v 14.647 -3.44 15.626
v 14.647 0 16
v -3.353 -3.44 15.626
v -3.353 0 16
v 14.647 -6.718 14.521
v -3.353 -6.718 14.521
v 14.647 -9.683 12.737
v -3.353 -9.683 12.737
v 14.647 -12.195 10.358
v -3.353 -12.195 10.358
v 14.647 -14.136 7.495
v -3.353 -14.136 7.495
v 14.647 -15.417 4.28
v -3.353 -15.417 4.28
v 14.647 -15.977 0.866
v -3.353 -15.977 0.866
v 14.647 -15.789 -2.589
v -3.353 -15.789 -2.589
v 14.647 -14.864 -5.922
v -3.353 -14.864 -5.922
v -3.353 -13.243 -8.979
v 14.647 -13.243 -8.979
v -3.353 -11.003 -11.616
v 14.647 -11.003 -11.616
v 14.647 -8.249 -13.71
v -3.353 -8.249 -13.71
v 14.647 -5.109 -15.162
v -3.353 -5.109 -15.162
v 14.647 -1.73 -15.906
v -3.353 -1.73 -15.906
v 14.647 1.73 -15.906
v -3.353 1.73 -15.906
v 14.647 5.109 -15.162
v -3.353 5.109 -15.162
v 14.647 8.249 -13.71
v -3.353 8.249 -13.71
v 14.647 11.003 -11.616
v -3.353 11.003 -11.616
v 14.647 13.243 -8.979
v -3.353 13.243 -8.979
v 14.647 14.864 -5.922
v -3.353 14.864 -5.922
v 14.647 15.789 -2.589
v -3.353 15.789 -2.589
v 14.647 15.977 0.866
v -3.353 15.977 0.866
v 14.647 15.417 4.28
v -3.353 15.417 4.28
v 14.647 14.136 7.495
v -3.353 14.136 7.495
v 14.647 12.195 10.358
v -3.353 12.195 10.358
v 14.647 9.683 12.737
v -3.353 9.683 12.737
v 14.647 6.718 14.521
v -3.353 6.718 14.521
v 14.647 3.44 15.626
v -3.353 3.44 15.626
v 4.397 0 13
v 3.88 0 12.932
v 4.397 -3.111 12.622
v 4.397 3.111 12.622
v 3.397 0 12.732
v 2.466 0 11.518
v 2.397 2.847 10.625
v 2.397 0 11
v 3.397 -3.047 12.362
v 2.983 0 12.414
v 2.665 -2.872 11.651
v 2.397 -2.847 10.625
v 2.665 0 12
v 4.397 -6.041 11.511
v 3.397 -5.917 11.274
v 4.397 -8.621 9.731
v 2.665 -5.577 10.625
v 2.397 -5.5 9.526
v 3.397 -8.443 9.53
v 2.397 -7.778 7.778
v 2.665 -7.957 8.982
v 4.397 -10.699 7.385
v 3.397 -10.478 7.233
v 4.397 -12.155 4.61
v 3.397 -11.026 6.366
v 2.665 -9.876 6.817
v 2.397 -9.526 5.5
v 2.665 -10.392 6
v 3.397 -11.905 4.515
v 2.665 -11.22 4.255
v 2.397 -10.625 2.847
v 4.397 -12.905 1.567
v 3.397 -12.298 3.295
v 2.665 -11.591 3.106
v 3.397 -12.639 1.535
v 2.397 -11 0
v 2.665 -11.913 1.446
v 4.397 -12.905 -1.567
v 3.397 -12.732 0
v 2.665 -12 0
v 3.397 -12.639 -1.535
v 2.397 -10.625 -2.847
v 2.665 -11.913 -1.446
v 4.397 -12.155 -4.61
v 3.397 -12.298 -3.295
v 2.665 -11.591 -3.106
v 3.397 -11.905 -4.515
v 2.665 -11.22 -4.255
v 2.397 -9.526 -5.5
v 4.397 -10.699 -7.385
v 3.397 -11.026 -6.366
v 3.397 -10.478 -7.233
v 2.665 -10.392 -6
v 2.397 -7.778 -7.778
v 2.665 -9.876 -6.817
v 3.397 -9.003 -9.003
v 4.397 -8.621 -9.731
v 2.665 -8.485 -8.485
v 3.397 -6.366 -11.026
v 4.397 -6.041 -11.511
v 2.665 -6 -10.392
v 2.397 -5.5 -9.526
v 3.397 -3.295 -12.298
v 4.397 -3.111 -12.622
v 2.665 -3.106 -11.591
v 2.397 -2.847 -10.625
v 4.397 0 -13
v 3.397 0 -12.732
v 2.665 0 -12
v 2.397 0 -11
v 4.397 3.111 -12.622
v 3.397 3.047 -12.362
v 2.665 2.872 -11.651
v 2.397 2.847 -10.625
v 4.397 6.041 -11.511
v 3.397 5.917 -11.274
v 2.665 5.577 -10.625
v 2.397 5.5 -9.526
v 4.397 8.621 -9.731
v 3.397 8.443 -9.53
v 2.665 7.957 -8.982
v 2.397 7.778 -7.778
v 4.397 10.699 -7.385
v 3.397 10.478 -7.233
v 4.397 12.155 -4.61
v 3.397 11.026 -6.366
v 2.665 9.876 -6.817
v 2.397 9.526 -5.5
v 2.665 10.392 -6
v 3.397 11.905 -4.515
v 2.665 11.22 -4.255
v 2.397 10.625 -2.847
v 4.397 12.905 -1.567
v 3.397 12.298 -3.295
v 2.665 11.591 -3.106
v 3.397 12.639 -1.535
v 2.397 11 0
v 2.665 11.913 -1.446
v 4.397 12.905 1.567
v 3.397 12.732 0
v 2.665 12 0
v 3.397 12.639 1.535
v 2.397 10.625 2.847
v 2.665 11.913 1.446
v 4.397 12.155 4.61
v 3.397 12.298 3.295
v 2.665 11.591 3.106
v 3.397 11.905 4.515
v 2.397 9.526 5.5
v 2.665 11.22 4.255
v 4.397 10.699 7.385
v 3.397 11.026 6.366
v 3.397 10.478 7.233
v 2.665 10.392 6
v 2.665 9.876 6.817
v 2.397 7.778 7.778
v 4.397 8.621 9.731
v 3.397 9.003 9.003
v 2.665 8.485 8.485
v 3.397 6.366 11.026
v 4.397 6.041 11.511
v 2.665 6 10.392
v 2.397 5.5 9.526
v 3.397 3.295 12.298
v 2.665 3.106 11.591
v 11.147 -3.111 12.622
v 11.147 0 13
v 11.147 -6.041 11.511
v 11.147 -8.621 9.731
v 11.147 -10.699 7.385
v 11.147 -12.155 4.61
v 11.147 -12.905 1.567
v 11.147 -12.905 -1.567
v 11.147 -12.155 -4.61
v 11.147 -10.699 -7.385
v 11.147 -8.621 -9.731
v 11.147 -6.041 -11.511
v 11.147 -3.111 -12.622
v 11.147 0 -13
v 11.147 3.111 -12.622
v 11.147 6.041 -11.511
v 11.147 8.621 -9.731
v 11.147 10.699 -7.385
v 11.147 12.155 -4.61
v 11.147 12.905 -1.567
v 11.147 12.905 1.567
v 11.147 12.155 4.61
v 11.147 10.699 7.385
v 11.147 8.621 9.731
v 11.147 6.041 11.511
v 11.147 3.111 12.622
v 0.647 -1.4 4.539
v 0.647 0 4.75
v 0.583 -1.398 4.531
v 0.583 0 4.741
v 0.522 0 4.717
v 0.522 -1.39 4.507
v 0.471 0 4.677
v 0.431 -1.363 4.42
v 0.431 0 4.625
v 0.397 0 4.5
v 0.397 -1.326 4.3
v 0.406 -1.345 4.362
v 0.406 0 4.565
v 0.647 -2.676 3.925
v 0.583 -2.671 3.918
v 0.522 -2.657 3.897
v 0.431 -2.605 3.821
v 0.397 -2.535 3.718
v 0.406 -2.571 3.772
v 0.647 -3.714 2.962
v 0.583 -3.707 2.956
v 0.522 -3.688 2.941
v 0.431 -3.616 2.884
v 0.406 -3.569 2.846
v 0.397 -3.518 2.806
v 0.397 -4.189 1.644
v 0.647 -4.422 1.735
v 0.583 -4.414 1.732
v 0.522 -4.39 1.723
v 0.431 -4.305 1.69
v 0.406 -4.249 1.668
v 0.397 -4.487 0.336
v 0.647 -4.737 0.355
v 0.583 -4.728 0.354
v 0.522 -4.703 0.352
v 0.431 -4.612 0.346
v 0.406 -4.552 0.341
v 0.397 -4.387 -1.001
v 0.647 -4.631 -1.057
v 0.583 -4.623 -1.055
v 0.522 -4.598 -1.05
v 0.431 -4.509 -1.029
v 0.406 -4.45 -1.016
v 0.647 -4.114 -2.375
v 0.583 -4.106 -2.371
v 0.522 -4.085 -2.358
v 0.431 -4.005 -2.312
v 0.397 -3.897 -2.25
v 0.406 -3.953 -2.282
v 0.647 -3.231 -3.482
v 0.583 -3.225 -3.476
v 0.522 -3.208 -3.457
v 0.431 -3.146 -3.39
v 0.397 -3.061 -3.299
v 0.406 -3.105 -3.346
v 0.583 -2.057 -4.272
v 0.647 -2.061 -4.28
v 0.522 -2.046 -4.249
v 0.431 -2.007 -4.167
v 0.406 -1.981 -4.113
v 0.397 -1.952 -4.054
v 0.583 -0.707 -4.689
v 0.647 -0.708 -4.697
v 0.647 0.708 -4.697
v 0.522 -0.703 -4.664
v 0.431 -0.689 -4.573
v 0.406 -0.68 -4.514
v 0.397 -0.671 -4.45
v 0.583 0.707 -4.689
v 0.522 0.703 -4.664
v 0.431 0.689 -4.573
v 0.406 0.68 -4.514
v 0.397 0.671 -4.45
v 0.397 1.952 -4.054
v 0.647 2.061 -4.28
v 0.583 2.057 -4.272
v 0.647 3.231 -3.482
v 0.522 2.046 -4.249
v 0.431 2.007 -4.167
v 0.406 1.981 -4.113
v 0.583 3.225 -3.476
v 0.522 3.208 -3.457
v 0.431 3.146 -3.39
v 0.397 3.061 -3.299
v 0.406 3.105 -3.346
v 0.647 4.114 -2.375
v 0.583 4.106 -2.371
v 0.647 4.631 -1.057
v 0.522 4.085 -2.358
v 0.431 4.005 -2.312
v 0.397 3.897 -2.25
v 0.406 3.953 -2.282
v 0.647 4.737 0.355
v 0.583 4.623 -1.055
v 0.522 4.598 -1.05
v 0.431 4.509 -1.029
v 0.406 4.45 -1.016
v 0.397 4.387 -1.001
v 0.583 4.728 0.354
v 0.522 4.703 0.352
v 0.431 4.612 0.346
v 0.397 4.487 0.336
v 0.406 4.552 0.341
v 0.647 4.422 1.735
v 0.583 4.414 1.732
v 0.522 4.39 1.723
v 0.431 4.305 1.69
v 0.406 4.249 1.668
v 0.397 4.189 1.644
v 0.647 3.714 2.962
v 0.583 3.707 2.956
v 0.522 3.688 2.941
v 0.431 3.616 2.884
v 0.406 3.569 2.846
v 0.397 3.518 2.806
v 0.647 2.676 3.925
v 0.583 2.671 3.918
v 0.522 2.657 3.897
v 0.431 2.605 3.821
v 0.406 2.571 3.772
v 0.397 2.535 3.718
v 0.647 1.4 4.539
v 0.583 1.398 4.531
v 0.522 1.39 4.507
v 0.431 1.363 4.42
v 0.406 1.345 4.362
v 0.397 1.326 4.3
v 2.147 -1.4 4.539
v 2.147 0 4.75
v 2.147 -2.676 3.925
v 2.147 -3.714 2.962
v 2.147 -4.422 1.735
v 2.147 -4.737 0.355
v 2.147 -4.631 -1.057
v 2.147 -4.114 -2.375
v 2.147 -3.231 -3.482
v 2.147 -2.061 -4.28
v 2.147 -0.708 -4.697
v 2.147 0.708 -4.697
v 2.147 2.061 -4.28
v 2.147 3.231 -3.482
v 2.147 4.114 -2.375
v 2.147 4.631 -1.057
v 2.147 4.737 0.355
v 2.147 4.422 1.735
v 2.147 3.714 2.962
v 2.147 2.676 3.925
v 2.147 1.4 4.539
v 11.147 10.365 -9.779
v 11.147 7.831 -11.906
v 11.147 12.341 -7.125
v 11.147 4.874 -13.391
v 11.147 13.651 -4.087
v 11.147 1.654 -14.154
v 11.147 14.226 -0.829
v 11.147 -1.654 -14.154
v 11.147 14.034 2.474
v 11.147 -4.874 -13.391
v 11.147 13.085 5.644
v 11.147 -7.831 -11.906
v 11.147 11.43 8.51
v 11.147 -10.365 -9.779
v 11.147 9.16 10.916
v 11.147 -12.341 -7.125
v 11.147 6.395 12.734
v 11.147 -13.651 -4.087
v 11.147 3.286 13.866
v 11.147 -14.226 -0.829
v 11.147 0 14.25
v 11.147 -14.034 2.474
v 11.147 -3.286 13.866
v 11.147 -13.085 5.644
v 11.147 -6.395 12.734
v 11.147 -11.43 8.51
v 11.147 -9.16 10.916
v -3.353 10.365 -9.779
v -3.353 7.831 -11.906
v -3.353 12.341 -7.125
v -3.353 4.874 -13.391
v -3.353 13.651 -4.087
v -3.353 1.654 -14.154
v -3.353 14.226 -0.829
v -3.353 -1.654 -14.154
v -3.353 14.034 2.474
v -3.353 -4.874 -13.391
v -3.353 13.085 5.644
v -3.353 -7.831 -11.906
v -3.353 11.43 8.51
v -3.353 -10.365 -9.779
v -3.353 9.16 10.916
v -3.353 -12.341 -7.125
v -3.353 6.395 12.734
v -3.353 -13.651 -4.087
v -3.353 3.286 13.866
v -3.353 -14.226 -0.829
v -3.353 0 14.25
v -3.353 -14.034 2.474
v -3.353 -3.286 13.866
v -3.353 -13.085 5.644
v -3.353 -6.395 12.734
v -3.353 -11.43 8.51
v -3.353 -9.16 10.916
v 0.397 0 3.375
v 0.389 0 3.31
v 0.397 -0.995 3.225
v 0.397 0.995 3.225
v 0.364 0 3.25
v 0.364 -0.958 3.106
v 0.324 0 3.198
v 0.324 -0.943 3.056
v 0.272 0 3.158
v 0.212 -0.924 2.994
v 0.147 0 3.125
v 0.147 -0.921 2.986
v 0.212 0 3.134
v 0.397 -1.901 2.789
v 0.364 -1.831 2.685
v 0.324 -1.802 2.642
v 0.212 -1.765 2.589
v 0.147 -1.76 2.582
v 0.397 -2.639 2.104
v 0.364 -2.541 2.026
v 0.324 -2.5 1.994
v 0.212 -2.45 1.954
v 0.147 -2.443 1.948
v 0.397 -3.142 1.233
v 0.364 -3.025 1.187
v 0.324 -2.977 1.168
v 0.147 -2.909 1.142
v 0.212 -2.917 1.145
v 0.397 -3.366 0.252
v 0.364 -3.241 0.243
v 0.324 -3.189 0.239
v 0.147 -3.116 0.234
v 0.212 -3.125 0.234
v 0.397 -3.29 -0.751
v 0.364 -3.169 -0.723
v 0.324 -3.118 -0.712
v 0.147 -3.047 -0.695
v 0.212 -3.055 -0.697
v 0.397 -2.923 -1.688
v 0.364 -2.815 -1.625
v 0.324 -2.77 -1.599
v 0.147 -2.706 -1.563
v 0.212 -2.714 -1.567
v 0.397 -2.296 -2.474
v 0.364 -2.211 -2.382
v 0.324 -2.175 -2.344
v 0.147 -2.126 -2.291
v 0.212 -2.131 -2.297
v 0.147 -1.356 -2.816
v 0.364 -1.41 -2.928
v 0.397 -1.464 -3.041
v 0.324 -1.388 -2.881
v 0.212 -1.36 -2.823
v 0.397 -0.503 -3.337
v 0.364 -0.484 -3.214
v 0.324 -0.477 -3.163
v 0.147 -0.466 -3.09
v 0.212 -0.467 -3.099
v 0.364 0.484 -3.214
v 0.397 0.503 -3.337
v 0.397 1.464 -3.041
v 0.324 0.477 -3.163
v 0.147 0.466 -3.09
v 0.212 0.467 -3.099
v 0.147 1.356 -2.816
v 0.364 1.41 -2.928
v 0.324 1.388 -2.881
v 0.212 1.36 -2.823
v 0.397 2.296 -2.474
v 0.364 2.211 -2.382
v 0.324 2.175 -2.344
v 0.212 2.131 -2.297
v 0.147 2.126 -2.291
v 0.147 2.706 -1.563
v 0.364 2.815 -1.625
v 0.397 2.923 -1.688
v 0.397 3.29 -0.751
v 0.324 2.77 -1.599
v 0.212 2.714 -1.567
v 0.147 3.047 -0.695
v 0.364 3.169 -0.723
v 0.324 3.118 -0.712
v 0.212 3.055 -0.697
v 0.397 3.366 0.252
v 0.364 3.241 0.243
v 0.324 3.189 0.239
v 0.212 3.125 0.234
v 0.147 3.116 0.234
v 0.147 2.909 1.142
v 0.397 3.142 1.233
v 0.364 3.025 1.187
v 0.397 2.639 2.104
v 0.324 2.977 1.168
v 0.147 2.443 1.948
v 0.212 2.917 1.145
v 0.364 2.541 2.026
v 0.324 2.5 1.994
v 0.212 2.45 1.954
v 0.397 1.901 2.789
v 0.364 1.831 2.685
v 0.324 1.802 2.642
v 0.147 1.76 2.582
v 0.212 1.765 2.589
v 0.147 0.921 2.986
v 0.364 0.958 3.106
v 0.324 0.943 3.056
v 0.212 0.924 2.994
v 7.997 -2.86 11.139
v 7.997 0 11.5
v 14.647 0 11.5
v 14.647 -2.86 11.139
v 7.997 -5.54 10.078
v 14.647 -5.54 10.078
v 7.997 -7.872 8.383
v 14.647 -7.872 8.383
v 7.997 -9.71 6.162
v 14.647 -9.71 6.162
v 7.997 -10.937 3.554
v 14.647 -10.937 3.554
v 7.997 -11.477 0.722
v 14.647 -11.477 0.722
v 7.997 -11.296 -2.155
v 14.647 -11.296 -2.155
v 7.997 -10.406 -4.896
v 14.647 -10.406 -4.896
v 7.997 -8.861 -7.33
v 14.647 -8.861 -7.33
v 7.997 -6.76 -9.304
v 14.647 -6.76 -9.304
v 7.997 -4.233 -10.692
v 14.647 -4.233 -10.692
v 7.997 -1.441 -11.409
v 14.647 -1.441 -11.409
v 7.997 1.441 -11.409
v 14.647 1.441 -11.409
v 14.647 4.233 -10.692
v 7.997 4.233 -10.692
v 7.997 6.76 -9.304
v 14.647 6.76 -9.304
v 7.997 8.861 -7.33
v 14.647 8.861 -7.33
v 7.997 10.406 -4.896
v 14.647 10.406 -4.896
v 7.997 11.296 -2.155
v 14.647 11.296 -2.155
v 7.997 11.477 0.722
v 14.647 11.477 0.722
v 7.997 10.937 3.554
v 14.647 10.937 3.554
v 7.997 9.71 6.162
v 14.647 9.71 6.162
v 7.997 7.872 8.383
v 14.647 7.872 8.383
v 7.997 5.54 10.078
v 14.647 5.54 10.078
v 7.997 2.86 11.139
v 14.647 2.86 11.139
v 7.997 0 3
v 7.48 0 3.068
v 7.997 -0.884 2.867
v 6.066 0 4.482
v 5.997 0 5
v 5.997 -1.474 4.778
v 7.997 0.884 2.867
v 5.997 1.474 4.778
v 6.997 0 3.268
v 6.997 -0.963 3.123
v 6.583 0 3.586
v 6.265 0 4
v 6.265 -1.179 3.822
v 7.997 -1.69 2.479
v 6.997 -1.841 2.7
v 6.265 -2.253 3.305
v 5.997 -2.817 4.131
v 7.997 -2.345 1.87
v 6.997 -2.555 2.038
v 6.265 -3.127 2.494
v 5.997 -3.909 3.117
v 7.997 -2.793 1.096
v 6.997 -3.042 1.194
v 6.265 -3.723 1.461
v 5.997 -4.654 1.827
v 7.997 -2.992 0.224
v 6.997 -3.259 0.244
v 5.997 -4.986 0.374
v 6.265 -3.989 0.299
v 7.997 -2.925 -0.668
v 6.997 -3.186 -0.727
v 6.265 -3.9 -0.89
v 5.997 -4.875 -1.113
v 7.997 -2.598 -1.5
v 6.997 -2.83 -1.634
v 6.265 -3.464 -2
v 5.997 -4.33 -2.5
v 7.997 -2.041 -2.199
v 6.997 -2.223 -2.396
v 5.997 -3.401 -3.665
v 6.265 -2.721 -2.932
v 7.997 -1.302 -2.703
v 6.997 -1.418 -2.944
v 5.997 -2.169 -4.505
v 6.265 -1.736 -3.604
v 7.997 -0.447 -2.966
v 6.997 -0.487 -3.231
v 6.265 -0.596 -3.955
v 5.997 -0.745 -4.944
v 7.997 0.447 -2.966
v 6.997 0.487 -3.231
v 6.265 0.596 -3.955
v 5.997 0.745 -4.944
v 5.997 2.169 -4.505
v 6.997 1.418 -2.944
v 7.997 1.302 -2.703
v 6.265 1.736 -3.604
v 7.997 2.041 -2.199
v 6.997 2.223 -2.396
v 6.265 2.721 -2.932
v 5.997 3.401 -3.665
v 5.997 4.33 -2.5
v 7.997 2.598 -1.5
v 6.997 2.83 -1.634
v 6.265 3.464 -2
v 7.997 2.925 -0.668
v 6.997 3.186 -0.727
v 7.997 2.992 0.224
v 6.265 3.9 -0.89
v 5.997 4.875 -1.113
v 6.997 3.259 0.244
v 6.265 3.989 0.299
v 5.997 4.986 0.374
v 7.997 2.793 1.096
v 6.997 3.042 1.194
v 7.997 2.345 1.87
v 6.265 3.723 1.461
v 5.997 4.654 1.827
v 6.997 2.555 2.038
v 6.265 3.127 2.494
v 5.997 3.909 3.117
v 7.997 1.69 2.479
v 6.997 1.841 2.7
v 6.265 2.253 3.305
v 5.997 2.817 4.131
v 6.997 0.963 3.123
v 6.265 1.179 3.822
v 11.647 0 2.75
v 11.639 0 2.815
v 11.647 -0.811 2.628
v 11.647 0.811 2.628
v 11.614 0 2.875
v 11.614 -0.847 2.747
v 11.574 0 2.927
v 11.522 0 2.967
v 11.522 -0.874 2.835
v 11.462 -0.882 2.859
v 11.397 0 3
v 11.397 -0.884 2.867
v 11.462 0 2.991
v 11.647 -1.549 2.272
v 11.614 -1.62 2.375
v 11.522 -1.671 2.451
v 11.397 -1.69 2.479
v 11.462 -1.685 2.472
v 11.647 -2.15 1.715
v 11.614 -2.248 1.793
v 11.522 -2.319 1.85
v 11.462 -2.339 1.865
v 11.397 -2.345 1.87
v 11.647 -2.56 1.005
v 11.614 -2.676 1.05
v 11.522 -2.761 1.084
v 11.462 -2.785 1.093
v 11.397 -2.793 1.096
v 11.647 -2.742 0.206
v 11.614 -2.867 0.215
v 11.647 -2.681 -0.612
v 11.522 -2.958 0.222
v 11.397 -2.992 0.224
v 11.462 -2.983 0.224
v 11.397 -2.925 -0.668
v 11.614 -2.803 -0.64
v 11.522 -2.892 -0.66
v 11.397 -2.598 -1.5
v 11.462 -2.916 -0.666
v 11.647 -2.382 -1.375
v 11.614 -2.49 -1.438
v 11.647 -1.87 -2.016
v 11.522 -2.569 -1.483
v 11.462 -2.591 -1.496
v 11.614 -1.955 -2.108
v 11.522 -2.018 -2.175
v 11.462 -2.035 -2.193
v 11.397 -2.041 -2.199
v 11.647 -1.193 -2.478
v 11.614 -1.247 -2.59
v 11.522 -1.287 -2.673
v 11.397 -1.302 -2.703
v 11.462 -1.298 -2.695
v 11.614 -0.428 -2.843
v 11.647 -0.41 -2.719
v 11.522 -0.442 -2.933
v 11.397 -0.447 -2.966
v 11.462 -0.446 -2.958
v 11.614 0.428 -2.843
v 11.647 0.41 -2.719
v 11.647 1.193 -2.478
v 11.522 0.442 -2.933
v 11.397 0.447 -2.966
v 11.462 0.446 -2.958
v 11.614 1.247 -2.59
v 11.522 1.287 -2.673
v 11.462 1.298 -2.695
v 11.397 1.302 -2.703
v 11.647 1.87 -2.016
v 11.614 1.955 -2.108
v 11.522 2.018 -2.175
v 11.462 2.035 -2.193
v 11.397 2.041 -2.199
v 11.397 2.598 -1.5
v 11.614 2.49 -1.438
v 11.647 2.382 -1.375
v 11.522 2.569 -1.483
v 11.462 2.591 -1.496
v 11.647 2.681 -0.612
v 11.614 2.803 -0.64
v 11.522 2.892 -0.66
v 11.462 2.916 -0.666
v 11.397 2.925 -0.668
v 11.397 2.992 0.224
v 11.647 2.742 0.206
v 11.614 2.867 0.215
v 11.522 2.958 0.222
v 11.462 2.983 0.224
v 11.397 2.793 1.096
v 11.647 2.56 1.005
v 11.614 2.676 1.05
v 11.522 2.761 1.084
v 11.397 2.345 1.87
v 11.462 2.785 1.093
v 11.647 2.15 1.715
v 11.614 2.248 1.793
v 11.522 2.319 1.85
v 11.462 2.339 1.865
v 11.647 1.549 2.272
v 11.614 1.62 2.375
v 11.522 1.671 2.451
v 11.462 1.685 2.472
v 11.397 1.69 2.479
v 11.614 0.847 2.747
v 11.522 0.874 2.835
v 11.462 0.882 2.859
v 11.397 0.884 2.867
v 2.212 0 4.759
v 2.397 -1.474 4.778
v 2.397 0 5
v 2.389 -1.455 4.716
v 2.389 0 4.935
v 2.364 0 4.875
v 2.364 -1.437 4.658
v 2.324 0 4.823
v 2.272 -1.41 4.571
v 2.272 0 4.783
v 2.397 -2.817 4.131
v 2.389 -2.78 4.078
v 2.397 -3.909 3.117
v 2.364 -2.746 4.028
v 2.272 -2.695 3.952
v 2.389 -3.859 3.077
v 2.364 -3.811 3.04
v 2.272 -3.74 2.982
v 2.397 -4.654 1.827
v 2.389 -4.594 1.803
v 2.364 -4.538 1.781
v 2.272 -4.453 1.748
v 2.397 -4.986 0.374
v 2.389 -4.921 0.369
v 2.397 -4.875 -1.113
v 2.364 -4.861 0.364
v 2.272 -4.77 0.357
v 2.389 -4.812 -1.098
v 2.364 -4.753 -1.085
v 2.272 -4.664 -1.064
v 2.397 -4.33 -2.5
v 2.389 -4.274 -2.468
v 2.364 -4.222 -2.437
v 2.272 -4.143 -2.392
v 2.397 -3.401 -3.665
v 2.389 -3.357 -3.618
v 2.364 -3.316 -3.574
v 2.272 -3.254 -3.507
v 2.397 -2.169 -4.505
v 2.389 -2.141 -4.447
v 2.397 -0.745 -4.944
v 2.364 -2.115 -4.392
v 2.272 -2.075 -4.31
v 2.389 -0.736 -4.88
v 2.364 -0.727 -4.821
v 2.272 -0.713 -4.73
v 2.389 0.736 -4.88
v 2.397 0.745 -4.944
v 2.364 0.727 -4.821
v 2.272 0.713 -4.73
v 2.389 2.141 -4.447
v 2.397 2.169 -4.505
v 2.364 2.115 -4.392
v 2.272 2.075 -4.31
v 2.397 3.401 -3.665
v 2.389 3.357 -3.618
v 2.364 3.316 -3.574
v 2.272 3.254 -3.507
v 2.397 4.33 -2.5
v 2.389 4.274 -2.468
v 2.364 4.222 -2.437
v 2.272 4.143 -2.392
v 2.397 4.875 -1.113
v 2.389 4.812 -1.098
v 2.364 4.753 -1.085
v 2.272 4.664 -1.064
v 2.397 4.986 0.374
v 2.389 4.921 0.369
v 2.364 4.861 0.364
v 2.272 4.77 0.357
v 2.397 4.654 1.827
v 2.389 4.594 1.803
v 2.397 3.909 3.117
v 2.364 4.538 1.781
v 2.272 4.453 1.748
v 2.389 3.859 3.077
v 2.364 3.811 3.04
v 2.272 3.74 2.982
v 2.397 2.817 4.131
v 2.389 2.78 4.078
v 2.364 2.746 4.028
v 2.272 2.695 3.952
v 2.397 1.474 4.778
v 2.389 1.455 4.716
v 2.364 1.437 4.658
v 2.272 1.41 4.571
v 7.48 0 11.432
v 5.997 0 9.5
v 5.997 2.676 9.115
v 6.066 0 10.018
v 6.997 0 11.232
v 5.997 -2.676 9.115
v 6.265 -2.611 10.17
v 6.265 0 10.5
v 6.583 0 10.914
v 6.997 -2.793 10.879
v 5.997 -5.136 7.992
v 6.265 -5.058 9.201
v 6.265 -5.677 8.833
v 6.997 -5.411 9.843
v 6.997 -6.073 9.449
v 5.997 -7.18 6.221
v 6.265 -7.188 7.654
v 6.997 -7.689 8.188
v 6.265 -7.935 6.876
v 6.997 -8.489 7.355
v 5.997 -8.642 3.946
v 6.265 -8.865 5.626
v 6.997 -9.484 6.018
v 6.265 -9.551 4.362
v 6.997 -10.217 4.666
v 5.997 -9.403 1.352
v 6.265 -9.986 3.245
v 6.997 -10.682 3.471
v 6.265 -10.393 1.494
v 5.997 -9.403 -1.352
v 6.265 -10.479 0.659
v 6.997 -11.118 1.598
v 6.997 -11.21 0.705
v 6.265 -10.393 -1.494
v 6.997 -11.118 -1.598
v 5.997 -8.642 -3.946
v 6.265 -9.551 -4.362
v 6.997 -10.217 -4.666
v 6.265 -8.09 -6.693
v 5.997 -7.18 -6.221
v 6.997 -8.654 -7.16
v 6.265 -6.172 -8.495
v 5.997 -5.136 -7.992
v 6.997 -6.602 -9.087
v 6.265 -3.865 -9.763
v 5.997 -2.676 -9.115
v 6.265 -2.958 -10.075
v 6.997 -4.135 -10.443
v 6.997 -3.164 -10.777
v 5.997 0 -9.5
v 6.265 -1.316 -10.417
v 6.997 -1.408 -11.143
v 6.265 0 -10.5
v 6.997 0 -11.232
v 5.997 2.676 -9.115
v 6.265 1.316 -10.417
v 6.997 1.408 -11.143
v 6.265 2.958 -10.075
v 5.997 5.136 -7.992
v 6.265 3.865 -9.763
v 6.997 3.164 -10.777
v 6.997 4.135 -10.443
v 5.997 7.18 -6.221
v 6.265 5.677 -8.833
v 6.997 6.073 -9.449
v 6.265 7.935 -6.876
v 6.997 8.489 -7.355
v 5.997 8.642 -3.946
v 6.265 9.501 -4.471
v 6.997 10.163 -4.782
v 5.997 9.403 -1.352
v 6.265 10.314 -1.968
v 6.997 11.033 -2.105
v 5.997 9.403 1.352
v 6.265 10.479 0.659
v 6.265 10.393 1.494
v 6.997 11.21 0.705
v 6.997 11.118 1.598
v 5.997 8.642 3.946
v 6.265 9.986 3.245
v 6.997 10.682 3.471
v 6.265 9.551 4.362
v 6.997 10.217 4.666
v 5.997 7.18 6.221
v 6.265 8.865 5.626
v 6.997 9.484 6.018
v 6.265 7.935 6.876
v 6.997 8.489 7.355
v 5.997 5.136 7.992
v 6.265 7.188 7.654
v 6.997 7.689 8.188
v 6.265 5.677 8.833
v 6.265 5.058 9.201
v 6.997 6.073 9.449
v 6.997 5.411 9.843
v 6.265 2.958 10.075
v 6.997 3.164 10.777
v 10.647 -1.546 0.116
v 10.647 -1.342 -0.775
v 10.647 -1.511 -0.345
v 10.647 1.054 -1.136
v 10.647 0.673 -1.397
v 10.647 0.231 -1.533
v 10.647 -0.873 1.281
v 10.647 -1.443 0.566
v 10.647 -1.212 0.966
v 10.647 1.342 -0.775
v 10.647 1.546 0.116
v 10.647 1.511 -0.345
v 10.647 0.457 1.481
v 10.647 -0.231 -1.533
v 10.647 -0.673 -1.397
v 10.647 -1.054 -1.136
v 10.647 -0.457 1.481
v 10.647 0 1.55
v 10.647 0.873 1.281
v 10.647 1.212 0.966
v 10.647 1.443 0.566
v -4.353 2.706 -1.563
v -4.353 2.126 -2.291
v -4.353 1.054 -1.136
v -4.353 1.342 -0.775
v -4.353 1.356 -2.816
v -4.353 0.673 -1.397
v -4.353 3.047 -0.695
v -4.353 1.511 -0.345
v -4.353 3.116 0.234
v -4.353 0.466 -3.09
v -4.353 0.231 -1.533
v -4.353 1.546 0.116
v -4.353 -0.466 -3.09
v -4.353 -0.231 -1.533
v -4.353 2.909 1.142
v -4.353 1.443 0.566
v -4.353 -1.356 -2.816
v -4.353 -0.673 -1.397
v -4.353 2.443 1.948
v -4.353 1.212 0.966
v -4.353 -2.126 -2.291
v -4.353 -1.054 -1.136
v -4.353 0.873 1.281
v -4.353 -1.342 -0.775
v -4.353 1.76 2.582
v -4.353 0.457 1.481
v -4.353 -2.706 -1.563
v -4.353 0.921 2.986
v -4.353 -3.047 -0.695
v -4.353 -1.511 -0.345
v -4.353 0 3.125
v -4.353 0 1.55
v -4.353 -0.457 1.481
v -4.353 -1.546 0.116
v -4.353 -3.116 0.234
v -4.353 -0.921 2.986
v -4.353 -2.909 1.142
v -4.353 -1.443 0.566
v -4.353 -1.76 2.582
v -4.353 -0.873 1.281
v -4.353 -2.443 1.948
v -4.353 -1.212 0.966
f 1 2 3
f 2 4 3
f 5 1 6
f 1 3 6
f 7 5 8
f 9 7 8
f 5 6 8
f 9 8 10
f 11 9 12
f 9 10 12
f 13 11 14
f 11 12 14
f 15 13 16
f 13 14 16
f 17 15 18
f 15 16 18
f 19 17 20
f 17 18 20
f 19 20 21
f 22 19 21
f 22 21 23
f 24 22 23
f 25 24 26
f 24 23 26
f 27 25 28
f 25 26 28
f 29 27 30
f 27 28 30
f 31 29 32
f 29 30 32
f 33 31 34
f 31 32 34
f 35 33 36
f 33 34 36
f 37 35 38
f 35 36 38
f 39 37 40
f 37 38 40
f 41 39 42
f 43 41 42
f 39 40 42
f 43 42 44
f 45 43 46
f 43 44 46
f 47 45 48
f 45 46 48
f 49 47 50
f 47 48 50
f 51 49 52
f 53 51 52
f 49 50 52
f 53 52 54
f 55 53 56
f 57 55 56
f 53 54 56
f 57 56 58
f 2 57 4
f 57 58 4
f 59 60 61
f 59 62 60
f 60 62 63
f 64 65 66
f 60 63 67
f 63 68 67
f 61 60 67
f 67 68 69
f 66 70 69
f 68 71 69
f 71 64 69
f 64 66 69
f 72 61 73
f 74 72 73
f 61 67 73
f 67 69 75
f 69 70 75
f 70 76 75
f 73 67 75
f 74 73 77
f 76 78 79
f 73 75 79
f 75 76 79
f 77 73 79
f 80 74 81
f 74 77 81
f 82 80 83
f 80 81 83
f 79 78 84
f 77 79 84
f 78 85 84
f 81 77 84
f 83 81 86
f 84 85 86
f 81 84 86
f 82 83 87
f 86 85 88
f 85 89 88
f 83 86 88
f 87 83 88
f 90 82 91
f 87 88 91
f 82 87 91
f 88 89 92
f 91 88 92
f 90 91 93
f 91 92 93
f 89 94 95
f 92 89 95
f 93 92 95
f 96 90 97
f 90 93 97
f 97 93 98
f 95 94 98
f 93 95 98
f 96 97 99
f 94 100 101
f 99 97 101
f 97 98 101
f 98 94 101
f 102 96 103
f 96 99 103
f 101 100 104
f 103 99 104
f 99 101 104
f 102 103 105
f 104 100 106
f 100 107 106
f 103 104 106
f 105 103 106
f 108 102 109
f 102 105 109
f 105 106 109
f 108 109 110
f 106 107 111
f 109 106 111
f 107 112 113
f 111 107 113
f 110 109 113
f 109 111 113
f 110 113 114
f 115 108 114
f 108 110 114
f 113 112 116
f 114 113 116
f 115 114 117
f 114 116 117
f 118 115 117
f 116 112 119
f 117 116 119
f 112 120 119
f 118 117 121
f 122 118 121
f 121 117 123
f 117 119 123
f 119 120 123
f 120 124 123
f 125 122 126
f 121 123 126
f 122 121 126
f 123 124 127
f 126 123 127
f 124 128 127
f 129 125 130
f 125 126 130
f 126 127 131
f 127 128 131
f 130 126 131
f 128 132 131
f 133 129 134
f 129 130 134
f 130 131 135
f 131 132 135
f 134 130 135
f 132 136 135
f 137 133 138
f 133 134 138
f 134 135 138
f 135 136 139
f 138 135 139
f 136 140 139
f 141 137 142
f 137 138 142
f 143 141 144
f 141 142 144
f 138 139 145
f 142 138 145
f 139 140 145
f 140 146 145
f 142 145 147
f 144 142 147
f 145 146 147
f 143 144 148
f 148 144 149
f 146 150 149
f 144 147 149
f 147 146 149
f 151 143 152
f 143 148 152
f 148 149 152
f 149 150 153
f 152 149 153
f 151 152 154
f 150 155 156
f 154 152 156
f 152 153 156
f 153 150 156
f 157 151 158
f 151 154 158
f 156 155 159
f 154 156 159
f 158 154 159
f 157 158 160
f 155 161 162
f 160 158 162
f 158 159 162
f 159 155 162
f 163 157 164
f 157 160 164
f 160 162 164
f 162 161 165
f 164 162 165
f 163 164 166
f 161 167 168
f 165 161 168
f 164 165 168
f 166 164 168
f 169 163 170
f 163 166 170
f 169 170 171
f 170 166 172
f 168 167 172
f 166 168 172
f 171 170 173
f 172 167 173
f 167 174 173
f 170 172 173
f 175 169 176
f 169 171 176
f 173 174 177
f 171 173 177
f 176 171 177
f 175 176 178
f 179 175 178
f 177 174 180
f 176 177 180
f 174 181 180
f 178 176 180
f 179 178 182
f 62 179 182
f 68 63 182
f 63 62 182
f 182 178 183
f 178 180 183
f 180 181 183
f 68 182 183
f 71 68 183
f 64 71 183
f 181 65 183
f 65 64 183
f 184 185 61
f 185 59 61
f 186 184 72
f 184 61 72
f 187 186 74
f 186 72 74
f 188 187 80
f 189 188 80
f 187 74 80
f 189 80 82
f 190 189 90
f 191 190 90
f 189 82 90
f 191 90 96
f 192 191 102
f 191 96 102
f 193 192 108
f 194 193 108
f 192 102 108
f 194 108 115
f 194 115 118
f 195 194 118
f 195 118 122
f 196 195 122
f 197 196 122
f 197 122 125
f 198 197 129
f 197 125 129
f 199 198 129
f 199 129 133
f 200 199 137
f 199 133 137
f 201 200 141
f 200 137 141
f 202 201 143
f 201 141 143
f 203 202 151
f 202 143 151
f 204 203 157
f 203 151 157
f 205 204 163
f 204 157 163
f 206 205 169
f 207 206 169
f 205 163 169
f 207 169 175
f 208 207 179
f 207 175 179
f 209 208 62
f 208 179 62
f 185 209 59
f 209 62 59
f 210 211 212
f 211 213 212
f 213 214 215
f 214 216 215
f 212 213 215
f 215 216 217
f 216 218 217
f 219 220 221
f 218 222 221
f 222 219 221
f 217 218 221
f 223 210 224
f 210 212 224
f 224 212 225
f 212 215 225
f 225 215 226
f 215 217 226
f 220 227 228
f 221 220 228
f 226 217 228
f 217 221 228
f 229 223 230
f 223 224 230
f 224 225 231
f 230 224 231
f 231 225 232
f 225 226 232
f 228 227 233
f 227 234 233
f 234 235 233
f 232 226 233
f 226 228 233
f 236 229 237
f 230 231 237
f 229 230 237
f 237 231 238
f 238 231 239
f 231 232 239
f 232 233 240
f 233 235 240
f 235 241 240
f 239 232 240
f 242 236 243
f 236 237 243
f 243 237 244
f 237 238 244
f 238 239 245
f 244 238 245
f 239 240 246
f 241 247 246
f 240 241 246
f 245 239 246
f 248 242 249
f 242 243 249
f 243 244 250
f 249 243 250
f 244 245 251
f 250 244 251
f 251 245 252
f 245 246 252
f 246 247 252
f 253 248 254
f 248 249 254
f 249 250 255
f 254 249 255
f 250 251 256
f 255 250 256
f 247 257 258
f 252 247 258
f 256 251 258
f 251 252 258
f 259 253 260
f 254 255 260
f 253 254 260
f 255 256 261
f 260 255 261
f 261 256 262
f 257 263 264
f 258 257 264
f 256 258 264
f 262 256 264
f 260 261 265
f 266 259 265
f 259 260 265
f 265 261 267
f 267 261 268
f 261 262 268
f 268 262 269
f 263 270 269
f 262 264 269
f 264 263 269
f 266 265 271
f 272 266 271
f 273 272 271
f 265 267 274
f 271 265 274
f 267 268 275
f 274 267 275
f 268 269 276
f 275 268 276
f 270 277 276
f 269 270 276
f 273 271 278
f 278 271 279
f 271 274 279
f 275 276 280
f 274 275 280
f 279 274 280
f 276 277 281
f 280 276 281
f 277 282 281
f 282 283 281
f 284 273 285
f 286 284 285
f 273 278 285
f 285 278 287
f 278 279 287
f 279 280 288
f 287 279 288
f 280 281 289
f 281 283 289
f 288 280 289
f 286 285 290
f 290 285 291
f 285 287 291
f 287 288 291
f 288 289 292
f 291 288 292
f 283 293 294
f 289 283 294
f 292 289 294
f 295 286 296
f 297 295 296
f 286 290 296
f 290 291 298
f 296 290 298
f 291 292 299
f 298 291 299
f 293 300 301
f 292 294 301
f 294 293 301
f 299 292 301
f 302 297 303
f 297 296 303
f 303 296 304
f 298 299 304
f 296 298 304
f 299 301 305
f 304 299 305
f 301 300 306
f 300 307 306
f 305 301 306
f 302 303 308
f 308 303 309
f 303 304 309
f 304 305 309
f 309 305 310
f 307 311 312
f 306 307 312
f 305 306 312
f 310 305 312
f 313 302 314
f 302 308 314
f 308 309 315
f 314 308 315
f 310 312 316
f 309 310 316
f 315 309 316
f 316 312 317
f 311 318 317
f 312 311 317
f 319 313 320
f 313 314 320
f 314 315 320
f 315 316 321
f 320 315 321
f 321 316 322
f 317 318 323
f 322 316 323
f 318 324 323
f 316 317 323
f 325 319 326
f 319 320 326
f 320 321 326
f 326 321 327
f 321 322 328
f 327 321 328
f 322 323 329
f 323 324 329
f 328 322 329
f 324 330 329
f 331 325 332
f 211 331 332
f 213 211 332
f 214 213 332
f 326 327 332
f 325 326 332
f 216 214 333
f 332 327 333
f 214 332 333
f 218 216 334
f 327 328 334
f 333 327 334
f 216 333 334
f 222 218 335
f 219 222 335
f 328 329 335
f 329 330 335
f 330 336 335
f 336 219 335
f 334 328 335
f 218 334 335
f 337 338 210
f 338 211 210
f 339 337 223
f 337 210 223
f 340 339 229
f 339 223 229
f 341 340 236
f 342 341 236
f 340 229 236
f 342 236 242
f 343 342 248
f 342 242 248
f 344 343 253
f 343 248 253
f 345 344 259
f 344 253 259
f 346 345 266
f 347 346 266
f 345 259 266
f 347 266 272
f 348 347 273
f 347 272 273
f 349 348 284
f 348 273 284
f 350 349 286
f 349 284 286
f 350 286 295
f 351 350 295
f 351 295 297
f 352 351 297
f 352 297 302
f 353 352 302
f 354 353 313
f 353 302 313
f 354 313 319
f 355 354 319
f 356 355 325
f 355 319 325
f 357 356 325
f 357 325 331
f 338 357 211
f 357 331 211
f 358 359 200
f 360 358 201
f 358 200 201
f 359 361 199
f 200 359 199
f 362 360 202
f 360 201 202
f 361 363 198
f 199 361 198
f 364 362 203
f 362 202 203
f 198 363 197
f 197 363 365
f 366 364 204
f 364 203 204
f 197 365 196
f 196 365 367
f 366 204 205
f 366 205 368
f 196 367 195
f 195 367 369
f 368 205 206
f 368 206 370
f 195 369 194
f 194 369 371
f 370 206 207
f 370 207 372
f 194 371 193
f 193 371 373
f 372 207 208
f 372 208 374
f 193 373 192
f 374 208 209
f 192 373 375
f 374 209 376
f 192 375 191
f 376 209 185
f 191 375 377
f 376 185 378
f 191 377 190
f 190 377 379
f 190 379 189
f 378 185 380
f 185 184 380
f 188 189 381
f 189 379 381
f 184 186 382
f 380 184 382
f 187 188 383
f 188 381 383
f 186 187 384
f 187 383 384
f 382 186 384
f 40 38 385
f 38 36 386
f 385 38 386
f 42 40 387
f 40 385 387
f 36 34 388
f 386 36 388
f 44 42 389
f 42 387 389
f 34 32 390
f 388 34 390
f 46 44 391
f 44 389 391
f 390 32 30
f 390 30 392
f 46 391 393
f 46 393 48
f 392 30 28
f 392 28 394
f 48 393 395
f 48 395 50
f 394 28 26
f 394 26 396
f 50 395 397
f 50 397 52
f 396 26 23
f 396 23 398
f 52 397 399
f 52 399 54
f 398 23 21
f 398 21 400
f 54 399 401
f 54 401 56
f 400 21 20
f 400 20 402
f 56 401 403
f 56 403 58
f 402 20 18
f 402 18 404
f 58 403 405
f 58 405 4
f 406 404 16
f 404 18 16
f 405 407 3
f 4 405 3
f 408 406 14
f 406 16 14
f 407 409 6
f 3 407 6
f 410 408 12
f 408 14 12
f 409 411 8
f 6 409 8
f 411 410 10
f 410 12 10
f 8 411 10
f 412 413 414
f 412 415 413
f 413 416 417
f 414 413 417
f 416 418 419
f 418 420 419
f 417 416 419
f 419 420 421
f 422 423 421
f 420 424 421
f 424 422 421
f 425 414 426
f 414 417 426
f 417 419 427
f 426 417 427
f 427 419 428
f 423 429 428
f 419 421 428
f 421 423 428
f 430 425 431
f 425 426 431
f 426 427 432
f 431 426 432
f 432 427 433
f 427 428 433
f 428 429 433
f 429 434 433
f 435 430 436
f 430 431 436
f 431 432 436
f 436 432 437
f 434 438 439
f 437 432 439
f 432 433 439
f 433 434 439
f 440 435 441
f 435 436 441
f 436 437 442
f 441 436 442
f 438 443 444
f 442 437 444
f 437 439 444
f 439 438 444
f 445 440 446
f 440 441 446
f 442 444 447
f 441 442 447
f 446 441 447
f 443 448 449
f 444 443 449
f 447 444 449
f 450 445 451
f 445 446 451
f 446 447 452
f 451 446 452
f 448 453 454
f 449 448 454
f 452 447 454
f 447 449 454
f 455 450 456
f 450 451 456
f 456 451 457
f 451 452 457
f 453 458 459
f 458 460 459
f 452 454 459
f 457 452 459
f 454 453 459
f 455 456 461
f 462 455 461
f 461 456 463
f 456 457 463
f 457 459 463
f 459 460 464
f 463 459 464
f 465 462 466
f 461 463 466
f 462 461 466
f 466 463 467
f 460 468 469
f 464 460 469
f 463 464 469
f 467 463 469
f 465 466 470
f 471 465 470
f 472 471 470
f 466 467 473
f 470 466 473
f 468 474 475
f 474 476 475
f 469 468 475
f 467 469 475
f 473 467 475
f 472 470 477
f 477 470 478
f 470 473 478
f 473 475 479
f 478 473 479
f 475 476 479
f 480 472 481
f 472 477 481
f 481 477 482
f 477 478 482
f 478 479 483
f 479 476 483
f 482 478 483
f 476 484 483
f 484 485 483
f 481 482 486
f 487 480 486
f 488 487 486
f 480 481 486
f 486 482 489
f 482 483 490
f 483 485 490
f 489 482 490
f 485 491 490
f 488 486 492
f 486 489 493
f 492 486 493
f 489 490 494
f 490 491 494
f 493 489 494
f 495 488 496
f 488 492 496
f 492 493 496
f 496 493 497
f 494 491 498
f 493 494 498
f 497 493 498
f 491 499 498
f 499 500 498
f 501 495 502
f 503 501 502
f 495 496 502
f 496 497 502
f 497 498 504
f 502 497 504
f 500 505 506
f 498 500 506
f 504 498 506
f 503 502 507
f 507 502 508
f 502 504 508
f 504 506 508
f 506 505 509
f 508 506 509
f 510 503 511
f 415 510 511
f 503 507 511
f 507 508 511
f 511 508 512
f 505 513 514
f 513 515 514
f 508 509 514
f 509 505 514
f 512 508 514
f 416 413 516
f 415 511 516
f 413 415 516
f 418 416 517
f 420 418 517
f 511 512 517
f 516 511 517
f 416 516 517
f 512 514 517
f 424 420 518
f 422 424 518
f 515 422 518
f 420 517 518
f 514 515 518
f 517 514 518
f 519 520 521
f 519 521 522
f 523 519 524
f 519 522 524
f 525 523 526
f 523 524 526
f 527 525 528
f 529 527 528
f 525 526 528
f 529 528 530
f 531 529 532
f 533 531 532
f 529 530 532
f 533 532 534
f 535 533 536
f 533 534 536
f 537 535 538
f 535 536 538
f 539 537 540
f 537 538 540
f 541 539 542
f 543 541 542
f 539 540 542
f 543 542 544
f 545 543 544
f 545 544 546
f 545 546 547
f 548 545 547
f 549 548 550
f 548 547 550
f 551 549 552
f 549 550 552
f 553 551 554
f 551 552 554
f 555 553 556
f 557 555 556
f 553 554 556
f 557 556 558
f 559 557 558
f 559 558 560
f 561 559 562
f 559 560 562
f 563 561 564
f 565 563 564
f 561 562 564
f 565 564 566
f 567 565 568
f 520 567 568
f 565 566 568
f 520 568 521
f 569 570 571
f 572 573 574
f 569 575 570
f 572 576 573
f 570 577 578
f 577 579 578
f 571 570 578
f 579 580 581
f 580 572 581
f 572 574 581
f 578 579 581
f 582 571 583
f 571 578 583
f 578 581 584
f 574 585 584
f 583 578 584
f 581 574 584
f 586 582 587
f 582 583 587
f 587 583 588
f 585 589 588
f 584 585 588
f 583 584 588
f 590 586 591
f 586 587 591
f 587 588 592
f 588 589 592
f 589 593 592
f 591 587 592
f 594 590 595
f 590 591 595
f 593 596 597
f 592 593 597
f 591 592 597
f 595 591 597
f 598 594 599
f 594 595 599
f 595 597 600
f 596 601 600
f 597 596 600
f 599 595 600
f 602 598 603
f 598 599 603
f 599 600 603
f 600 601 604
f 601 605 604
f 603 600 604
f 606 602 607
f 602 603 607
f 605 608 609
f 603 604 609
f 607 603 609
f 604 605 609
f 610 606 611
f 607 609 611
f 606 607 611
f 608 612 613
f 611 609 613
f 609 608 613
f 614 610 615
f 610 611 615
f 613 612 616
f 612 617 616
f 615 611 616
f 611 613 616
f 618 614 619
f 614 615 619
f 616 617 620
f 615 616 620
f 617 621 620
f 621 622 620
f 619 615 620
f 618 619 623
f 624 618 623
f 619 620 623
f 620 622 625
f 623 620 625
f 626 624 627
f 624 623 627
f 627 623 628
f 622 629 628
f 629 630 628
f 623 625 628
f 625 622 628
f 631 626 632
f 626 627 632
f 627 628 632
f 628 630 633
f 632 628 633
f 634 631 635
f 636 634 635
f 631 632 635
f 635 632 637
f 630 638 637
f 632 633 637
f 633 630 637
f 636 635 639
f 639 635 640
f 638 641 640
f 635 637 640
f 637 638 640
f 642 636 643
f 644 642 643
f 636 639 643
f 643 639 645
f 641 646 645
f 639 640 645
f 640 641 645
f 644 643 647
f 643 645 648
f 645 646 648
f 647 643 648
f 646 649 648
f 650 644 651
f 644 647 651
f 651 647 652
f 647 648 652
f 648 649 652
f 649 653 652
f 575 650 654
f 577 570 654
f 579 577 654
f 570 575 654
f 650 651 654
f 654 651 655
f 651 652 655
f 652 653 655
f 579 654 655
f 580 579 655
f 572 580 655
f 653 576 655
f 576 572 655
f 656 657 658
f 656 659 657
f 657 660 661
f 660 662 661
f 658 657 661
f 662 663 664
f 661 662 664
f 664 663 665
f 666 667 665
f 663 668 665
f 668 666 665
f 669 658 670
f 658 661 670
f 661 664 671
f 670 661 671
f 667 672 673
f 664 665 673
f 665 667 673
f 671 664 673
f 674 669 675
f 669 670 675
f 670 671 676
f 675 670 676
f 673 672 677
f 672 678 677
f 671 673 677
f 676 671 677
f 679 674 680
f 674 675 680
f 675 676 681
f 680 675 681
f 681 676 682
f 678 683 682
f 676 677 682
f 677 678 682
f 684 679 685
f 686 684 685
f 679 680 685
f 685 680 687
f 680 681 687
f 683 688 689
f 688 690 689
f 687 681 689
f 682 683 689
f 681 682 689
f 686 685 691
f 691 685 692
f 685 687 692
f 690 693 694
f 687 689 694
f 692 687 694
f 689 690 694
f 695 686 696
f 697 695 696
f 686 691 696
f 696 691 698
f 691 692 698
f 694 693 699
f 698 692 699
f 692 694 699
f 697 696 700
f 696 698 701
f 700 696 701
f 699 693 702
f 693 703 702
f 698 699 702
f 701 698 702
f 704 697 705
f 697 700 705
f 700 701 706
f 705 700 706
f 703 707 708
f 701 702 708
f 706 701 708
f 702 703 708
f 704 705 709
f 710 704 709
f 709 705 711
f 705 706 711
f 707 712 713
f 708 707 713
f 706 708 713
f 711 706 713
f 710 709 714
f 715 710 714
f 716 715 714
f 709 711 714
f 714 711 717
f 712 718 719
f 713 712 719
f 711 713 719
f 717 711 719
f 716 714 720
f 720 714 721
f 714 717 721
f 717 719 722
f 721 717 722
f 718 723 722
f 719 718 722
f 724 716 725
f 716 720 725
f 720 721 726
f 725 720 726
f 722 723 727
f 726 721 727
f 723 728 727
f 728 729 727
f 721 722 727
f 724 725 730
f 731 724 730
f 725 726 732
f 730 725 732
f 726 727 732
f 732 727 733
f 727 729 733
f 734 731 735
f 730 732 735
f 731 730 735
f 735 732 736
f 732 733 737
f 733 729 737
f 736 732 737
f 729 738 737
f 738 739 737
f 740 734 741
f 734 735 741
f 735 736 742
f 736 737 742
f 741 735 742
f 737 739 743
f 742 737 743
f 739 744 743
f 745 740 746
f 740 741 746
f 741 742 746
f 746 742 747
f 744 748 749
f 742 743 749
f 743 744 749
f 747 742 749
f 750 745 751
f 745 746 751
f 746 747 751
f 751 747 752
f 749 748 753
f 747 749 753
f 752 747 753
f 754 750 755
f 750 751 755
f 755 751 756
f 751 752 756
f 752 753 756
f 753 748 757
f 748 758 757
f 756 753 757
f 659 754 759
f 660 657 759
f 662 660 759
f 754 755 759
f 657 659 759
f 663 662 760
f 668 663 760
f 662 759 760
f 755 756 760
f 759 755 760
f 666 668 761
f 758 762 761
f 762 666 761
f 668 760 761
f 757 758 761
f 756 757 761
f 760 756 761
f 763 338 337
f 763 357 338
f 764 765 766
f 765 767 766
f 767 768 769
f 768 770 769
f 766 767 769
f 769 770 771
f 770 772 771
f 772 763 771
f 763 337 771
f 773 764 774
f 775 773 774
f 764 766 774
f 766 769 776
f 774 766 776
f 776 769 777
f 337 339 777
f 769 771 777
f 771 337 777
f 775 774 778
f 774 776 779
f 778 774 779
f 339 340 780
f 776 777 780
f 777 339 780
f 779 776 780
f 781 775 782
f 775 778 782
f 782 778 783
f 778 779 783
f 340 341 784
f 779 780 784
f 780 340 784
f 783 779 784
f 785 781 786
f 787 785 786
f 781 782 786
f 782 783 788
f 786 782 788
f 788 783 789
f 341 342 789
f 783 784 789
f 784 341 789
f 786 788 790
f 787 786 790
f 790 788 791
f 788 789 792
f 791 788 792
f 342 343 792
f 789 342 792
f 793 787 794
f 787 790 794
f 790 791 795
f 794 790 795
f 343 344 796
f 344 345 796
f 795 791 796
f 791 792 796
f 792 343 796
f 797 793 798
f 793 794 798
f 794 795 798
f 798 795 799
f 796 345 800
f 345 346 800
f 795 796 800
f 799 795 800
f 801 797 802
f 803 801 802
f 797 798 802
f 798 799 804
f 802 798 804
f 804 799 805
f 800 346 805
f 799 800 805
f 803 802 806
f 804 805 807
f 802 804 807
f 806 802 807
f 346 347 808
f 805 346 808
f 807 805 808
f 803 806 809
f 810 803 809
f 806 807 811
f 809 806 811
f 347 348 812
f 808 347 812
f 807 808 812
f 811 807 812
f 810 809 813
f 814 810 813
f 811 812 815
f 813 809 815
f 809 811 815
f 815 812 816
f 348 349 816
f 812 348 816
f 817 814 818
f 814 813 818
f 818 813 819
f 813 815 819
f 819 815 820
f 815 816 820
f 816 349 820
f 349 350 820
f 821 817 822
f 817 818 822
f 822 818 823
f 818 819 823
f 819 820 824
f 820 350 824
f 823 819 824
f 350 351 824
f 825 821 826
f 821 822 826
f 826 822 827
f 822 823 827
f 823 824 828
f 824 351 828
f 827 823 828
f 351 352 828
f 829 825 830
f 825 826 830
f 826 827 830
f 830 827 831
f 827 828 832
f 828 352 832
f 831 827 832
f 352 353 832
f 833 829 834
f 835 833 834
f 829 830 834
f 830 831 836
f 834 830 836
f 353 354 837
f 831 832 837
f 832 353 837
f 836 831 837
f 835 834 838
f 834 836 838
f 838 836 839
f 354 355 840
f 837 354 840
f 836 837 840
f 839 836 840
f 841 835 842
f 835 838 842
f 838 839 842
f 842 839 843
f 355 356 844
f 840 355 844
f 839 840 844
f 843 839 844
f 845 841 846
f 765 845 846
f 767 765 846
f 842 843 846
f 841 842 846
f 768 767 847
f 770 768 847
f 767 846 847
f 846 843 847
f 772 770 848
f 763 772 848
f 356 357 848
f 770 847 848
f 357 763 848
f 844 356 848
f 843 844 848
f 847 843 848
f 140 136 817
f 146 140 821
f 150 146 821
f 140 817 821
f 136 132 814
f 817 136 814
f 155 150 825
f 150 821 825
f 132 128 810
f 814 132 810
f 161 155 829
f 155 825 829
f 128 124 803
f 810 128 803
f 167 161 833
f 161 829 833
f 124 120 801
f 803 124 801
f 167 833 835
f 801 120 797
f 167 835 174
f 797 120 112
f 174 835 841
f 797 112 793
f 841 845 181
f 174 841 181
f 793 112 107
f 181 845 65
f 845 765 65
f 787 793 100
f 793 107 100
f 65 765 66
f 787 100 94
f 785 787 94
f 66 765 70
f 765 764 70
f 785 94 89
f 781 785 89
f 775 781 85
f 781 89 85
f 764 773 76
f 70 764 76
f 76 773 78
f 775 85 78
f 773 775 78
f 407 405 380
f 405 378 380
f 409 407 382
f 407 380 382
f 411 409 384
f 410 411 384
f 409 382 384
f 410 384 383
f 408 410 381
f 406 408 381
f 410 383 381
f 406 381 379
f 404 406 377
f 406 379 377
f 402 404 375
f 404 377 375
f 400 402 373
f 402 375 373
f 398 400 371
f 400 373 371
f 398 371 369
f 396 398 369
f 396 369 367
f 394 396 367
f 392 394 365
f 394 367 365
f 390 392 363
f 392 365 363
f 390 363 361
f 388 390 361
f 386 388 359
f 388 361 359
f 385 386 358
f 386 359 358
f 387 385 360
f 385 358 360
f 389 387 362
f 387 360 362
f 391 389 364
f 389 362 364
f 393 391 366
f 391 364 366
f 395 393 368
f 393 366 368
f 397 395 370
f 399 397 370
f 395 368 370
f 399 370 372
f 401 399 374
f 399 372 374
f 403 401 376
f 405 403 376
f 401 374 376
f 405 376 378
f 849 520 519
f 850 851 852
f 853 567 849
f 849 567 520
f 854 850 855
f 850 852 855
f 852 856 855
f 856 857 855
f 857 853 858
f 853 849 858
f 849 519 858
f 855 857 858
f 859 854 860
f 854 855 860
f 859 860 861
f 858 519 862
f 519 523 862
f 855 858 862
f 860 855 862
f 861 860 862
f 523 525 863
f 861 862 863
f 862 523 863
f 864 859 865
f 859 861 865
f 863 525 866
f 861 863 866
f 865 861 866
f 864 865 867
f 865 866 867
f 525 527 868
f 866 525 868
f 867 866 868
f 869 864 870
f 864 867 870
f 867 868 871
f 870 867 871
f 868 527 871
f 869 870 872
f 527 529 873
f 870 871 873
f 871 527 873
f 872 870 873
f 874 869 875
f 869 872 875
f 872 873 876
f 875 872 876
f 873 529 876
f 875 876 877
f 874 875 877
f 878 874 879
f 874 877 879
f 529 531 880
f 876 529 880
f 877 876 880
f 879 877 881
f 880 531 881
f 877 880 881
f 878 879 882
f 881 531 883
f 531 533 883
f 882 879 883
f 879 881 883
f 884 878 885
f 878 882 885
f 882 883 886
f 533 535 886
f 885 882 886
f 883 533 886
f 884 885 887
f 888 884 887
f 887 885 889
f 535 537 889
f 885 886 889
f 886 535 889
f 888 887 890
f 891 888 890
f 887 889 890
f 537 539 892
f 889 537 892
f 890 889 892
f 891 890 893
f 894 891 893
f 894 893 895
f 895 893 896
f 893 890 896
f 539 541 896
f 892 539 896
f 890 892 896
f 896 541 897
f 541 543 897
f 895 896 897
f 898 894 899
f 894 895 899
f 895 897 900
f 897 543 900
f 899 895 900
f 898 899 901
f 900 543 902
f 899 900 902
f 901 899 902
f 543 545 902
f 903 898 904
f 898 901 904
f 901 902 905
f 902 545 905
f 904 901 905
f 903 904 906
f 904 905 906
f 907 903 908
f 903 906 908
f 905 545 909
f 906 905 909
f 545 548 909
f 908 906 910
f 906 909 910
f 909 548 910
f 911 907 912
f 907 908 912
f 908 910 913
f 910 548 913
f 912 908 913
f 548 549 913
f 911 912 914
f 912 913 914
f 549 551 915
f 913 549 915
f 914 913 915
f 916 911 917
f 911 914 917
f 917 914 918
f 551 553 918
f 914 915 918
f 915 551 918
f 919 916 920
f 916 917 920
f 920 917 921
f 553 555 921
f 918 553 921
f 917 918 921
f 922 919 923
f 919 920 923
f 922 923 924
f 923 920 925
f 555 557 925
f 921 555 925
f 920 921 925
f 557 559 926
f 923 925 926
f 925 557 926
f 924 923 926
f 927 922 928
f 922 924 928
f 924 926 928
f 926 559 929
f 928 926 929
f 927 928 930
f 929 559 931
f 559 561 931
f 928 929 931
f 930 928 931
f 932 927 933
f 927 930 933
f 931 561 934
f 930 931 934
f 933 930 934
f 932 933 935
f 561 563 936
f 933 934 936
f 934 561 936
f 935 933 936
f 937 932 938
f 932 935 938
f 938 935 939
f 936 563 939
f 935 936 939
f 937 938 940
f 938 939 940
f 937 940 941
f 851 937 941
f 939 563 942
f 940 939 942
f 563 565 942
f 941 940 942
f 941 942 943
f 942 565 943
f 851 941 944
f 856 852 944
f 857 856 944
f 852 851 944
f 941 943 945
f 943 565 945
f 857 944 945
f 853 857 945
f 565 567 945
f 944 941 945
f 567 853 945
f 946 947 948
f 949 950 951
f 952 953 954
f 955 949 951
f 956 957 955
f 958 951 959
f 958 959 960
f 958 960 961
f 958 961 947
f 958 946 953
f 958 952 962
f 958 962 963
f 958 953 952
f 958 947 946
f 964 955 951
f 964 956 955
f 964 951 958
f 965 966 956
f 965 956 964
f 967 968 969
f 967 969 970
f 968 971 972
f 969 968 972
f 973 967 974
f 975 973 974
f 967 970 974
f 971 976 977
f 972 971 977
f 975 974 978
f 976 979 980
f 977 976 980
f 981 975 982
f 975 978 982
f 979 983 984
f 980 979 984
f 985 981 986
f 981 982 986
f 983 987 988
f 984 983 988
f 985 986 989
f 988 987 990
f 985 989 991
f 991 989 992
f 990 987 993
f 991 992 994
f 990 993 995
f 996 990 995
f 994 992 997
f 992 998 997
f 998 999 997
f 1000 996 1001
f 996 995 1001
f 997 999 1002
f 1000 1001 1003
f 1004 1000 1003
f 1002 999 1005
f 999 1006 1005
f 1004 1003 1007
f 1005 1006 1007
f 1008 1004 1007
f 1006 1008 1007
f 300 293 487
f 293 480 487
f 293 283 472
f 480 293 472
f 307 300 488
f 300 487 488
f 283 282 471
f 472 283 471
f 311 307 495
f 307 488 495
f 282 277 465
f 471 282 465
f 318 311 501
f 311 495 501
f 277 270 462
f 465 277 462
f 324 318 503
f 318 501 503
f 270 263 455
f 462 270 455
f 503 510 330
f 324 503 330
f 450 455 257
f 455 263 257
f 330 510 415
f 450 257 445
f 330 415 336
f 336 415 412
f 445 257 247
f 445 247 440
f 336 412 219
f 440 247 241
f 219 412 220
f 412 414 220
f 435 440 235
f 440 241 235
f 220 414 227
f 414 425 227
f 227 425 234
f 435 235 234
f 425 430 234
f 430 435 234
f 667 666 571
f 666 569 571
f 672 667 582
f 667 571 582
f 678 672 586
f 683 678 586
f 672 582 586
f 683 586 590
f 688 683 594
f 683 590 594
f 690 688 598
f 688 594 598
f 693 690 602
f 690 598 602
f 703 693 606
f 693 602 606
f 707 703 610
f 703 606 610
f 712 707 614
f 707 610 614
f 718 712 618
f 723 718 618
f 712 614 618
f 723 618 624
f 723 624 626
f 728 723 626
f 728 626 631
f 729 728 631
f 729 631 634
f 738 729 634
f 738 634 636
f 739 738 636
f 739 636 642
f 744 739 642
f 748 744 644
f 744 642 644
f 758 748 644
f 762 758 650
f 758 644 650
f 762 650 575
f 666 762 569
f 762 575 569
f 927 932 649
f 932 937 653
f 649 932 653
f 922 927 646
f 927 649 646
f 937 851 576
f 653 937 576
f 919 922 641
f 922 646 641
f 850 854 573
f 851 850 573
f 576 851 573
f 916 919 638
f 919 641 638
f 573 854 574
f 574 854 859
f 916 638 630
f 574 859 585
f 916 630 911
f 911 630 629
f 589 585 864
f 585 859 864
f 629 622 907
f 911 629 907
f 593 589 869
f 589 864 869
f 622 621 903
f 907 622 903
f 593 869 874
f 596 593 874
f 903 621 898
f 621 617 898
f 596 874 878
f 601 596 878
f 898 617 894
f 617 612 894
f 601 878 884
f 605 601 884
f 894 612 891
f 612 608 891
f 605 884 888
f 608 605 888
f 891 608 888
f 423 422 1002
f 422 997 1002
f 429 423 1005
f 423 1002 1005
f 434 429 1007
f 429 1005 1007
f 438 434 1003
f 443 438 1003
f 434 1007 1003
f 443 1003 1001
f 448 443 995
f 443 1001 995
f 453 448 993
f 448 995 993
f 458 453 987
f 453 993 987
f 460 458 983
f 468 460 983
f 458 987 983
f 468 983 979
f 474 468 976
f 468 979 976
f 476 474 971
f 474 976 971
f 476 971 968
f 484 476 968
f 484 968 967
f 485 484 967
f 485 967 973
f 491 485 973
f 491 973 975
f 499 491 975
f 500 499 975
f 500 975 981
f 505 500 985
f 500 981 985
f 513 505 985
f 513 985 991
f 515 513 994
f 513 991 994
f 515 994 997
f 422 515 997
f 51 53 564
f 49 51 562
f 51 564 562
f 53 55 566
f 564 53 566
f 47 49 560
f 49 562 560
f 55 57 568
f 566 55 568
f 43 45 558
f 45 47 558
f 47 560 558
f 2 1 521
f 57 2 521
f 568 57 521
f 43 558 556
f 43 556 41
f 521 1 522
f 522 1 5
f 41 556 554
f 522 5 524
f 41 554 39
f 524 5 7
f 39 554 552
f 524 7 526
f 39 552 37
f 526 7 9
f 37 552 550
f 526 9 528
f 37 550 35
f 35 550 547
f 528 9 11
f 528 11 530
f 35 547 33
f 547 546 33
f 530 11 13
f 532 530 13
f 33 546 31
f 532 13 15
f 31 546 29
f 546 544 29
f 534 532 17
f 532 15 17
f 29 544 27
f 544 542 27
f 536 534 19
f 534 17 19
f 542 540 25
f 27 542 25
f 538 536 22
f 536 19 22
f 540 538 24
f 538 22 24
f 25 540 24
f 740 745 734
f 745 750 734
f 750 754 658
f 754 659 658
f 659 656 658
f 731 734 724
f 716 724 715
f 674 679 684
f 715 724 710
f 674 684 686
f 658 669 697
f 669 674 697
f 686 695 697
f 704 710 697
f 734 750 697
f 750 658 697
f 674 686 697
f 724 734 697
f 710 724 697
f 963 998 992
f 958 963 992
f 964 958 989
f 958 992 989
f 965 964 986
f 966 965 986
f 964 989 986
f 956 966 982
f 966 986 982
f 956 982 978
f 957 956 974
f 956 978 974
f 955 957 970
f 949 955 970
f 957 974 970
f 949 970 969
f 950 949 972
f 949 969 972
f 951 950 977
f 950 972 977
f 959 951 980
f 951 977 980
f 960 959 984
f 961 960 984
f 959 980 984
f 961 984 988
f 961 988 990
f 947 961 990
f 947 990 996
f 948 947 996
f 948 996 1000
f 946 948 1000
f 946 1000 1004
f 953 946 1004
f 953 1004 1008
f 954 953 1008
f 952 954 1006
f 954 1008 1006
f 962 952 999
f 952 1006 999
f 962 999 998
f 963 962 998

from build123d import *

# Parameters (mm, degrees)
SKETCH2_R          = 1.55
CUT_EXTRUDE1_DEPTH = 15


with BuildPart() as part:
    # Sketch1 → Revolve1 (revolve)
    with BuildSketch(Plane.XY, mode=Mode.PRIVATE) as revolve1_sk:
        with BuildLine():
            Line((14.647461996, 11.5), (14.647461996, 16))
            Line((14.647461996, 16), (-3.352538004, 16))
            Line((-3.352538004, 16), (-3.352538004, 14.25))
            Line((-3.352538004, 14.25), (11.147461996, 14.25))
            Line((11.147461996, 14.25), (11.147461996, 13))
            Line((11.147461996, 13), (4.397461996, 13))
            ThreePointArc((4.397461996, 13), (2.983248434, 12.414213562), (2.397461996, 11))
            Line((2.397461996, 11), (2.397461996, 5))
            ThreePointArc((2.397461996, 5), (2.324238692, 4.823223305), (2.147461996, 4.75))
            Line((2.147461996, 4.75), (0.647461996, 4.75))
            ThreePointArc((0.647461996, 4.75), (0.470685301, 4.676776695), (0.397461996, 4.5))
            Line((0.397461996, 4.5), (0.397461996, 3.375))
            ThreePointArc((0.397461996, 3.375), (0.324238692, 3.198223305), (0.147461996, 3.125))
            Line((0.147461996, 3.125), (-4.352538004, 3.125))
            Line((-4.352538004, 3.125), (-4.352538004, 0))
            Line((-4.352538004, 0), (11.647461996, 0))
            Line((11.647461996, 0), (11.647461996, 2.75))
            ThreePointArc((11.647461996, 2.75), (11.574238692, 2.926776695), (11.397461996, 3))
            Line((11.397461996, 3), (7.997461996, 3))
            ThreePointArc((7.997461996, 3), (6.583248434, 3.585786438), (5.997461996, 5))
            Line((5.997461996, 5), (5.997461996, 9.5))
            ThreePointArc((5.997461996, 9.5), (6.583248434, 10.914213562), (7.997461996, 11.5))
            Line((7.997461996, 11.5), (14.647461996, 11.5))
        make_face()
    revolve(revolve1_sk.sketch.rotate(Axis((0, 0, 0), (1, 0, 0)), 90), axis=Axis((0, 0, 0), (1, 0, 0)))

    # Sketch2 → Cut-Extrude1 (cut)
    with BuildSketch(Plane.ZY.offset(4.352538004)):
        Circle(SKETCH2_R)
    extrude(amount=-CUT_EXTRUDE1_DEPTH, mode=Mode.SUBTRACT)


solid = part.part
